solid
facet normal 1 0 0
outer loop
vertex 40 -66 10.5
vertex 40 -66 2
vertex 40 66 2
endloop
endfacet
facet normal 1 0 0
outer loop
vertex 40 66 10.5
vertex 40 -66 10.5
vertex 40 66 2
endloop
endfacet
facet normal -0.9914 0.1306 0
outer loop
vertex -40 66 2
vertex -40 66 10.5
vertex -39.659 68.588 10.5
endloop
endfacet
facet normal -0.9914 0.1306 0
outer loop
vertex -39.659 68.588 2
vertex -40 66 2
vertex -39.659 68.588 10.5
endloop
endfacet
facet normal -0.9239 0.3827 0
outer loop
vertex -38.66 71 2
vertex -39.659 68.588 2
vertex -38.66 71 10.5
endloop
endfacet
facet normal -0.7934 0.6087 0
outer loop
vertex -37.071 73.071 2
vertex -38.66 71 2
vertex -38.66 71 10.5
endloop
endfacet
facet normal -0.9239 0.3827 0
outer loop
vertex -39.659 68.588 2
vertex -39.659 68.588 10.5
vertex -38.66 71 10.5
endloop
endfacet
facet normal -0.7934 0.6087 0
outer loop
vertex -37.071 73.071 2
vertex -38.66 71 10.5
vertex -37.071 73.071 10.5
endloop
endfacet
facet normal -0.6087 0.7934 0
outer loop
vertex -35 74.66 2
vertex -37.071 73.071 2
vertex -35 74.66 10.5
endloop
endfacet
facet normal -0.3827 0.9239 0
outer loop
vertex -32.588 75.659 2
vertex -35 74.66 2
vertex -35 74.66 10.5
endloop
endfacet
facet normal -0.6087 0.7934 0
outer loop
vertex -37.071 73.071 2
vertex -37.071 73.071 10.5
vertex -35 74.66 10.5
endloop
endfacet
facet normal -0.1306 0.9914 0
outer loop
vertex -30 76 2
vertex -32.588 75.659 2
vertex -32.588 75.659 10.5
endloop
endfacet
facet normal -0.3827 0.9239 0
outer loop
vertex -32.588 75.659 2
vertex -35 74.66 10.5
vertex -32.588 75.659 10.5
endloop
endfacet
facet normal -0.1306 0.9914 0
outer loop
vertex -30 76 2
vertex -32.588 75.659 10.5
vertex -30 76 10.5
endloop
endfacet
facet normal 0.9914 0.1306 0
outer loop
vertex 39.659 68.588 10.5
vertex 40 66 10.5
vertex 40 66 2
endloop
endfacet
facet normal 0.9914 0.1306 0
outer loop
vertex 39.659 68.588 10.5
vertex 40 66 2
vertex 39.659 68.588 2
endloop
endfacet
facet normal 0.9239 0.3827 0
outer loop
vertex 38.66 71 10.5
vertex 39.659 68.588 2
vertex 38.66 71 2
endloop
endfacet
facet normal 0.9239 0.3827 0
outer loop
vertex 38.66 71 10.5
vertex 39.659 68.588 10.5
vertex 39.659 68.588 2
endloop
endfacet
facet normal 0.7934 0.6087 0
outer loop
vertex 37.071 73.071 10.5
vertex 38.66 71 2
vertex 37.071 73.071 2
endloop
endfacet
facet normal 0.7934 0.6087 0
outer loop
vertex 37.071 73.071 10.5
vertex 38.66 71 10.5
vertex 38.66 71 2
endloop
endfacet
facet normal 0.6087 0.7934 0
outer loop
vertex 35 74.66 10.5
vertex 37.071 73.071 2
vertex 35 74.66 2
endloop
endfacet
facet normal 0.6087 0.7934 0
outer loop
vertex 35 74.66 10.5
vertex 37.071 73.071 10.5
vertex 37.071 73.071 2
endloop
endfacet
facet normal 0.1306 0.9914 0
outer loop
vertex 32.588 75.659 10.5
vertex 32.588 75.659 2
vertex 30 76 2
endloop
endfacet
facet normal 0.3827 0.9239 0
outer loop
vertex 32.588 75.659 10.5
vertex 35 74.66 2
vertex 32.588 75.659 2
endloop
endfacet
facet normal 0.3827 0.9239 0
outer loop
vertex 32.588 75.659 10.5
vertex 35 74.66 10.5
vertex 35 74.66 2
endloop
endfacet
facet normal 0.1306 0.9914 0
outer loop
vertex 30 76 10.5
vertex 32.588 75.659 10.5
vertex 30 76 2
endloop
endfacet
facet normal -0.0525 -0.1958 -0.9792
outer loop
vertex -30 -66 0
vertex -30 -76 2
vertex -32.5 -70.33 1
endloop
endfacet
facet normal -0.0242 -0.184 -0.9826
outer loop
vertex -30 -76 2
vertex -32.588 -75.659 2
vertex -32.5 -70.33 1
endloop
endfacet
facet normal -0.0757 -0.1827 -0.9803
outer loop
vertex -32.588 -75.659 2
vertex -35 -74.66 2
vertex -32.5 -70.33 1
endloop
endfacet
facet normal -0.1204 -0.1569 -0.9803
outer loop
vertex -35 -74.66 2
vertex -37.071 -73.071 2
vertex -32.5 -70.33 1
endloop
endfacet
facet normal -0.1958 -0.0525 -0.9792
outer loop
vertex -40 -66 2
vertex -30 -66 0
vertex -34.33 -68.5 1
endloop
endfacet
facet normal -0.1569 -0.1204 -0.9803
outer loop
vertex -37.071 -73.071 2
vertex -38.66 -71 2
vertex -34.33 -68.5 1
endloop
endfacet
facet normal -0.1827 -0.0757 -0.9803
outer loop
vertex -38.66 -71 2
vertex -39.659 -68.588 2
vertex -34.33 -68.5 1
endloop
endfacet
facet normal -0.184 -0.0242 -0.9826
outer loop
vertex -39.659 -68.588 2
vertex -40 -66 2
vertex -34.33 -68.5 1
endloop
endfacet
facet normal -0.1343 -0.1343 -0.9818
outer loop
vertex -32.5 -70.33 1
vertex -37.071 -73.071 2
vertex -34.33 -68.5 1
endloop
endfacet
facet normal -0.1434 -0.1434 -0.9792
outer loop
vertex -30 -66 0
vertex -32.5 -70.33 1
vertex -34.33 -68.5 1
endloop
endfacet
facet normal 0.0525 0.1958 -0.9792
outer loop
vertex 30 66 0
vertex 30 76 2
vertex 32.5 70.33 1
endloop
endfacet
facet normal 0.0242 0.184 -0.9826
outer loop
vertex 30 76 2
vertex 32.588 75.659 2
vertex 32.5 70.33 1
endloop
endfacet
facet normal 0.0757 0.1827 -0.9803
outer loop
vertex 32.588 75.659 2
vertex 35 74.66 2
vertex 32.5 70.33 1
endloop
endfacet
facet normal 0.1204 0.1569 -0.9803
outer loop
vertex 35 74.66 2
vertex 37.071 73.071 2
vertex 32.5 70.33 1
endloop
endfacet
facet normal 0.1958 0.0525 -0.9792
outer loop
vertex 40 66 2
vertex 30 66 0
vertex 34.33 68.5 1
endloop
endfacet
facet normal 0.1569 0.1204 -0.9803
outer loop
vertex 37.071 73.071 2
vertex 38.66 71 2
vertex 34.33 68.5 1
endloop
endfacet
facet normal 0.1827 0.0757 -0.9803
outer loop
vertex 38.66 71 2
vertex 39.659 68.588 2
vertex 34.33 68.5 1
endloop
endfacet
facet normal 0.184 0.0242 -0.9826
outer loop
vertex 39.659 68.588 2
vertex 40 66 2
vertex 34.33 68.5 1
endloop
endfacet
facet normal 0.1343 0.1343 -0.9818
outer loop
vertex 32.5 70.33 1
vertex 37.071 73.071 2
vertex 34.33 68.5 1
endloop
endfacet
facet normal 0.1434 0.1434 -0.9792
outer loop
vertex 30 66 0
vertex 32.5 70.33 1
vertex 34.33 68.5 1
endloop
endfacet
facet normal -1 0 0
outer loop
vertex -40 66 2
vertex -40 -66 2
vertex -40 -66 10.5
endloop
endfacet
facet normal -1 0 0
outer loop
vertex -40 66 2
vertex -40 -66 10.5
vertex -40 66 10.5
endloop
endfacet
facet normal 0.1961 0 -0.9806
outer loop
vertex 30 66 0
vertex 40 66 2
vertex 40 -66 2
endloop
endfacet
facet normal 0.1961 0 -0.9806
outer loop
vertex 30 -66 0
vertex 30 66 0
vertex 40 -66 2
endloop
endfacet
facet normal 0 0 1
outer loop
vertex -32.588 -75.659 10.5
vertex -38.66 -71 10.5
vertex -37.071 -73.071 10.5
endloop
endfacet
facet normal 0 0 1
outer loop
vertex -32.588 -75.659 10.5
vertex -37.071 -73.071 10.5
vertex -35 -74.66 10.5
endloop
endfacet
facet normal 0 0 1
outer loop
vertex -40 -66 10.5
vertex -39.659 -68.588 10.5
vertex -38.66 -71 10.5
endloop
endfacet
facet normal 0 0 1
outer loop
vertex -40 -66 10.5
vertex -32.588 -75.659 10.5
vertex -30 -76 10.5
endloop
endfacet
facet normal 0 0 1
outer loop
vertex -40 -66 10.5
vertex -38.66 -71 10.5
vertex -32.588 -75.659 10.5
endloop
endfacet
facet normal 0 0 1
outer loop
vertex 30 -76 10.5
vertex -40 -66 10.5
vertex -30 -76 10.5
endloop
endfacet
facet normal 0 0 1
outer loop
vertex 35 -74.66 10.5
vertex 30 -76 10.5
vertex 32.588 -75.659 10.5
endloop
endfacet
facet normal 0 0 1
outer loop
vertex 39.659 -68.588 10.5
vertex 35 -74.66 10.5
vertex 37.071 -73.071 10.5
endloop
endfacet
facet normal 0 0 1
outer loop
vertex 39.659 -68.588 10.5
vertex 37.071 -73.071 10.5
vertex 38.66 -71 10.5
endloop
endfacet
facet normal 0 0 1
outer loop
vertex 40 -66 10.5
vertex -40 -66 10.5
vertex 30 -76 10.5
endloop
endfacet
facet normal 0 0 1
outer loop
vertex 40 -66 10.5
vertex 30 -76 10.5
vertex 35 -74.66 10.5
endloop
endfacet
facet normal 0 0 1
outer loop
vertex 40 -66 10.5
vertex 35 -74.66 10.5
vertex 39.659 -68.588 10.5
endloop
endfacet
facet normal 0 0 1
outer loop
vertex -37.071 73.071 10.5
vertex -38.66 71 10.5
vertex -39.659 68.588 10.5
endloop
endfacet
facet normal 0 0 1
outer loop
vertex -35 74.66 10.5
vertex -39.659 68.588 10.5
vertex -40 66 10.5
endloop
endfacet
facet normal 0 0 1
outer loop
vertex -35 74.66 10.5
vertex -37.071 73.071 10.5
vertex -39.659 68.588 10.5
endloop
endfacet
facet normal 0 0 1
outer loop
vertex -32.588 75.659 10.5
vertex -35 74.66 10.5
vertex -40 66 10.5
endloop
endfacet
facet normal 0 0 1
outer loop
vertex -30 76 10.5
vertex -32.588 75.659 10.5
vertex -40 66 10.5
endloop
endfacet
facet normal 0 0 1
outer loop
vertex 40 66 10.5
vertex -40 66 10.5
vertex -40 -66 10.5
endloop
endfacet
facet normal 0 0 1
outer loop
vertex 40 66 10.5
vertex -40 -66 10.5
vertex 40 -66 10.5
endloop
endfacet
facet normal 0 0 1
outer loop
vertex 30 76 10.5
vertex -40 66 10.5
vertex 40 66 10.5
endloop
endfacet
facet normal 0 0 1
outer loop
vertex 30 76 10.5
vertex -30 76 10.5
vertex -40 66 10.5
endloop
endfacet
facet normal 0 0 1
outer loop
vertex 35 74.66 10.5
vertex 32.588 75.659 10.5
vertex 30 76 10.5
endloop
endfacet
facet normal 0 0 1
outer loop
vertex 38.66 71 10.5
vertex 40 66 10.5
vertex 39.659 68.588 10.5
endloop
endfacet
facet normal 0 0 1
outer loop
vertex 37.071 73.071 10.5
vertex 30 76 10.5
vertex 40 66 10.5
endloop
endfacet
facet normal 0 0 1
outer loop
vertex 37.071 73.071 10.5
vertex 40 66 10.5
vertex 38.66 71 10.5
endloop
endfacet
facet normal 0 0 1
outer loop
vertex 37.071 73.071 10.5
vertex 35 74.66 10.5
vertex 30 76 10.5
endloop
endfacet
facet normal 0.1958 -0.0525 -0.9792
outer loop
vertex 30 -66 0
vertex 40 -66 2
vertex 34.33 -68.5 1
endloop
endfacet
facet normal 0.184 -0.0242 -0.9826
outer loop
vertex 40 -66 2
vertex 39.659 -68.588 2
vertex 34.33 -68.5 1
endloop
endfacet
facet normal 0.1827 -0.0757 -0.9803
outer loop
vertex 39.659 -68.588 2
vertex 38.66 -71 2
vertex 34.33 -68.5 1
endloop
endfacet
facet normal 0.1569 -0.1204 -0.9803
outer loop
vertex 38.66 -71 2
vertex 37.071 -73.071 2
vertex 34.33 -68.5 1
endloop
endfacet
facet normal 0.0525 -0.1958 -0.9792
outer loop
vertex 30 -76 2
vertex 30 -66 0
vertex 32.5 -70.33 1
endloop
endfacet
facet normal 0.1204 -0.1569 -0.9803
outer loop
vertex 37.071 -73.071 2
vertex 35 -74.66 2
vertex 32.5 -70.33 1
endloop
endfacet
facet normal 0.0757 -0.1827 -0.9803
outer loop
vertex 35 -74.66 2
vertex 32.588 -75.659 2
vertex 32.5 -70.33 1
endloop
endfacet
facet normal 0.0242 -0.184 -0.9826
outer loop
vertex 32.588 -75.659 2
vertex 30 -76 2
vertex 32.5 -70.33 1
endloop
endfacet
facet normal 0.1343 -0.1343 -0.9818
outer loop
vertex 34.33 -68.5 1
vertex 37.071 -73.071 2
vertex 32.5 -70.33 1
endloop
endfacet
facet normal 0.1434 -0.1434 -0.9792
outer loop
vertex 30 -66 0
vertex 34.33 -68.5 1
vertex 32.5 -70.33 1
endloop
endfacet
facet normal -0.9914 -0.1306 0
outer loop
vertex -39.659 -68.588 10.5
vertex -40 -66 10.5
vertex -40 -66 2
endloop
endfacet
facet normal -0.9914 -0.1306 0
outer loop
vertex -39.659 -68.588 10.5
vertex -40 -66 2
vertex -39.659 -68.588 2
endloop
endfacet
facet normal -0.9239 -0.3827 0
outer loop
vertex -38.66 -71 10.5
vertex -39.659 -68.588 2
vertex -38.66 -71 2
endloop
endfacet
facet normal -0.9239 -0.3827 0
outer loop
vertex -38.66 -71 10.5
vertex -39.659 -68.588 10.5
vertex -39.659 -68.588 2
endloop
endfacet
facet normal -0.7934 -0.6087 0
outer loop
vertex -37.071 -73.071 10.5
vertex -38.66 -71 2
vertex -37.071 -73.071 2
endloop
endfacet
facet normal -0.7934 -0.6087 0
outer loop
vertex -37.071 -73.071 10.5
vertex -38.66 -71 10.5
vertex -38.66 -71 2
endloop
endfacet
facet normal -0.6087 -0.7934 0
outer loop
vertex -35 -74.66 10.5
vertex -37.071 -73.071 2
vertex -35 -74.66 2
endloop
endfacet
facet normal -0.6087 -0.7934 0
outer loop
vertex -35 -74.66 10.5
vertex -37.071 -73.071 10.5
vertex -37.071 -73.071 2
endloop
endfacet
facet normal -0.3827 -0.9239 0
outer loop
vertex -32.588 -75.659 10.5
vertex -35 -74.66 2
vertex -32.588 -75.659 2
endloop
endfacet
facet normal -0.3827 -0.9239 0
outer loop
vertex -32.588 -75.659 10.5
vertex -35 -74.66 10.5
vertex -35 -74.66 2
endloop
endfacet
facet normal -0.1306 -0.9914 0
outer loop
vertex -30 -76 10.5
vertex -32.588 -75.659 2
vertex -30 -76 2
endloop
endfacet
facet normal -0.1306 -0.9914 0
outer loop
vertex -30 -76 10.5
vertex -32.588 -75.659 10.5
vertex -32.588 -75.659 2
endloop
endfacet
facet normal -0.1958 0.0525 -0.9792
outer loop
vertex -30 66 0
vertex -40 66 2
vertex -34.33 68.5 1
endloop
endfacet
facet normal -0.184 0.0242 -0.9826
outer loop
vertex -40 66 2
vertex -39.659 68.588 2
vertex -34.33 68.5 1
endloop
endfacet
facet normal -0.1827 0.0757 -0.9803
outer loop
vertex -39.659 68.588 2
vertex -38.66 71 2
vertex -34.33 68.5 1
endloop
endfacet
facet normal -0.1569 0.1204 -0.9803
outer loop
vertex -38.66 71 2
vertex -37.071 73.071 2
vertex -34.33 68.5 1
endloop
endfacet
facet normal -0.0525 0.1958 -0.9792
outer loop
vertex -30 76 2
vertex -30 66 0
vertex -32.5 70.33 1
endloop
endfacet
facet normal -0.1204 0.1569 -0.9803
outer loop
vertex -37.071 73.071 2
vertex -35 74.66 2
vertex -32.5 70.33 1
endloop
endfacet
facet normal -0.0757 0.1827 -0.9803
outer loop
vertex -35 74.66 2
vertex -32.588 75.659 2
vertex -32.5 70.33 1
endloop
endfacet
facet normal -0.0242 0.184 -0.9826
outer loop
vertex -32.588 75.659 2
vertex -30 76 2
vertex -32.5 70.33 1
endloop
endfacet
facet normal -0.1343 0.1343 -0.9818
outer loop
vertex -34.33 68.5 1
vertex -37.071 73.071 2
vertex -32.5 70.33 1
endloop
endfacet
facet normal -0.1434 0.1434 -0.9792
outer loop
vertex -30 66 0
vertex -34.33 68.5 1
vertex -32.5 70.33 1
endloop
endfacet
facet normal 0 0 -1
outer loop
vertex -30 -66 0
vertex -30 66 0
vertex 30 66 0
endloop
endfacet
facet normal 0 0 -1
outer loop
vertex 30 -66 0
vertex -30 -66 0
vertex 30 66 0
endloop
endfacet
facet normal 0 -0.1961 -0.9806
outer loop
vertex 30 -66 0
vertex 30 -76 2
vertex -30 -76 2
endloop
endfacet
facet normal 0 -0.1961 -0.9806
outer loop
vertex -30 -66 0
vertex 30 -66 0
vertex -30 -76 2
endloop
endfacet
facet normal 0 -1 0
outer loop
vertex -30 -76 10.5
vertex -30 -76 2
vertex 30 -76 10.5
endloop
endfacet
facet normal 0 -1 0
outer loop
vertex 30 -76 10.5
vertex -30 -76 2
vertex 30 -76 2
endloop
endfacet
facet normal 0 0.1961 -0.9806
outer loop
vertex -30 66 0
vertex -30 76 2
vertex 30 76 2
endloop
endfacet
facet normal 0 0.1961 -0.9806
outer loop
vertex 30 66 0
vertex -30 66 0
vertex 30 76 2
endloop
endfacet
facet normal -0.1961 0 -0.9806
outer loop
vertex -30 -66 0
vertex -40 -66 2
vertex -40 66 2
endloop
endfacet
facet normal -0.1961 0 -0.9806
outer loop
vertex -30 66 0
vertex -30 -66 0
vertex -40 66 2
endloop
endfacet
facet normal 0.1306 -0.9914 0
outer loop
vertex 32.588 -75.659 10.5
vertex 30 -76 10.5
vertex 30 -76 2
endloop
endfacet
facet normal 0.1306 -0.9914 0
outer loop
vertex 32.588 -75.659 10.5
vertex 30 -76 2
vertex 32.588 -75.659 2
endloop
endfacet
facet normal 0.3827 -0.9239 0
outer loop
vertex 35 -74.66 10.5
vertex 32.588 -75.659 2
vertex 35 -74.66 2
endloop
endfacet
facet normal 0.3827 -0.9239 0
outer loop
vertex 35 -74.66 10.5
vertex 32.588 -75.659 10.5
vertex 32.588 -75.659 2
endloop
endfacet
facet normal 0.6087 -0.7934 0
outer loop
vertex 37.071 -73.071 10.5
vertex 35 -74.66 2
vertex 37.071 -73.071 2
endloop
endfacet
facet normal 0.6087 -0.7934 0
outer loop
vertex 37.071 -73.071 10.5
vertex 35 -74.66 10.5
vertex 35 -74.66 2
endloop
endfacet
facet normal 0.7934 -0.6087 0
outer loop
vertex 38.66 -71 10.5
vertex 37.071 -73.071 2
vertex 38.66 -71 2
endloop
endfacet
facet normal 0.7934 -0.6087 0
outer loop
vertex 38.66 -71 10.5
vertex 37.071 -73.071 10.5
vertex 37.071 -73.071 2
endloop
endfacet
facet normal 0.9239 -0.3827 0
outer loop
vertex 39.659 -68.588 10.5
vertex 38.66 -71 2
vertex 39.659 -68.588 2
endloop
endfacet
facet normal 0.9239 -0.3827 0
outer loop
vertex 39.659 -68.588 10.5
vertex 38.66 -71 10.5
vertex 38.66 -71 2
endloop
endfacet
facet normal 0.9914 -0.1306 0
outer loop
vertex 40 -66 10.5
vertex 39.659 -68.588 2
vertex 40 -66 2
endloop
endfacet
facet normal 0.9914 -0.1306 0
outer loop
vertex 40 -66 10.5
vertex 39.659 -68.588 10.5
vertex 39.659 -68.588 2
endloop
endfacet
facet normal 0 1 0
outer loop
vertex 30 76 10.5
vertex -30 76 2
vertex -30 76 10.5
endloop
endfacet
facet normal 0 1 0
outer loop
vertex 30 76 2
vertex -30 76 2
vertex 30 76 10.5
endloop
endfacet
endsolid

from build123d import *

# Parameters (mm, degrees)
F0_W     = 80
F0_H     = 152
F1_DEPTH = 10.5
F2_R     = 10
F3_SIZE2 = 2
F3_SIZE  = 10


with BuildPart() as f1:
    # F0 (on Top) → F1 (new body)
    with BuildSketch(Plane.XY):
        Rectangle(F0_W, F0_H)
    extrude(amount=F1_DEPTH)

    # F2
    f2_edges = [f1.edges().sort_by_distance(p)[0] for p in [
        (-40, 76, 5.25),
        (40, 76, 5.25),
        (40, -76, 5.25),
        (-40, -76, 5.25),
    ]]
    fillet(f2_edges, radius=F2_R)

    # F3
    f3_edges = [f1.edges().sort_by_distance(p)[0] for p in [
        (0, 76, 0),
    ]]
    chamfer(f3_edges, length=F3_SIZE, length2=F3_SIZE2)


solid = f1.part
